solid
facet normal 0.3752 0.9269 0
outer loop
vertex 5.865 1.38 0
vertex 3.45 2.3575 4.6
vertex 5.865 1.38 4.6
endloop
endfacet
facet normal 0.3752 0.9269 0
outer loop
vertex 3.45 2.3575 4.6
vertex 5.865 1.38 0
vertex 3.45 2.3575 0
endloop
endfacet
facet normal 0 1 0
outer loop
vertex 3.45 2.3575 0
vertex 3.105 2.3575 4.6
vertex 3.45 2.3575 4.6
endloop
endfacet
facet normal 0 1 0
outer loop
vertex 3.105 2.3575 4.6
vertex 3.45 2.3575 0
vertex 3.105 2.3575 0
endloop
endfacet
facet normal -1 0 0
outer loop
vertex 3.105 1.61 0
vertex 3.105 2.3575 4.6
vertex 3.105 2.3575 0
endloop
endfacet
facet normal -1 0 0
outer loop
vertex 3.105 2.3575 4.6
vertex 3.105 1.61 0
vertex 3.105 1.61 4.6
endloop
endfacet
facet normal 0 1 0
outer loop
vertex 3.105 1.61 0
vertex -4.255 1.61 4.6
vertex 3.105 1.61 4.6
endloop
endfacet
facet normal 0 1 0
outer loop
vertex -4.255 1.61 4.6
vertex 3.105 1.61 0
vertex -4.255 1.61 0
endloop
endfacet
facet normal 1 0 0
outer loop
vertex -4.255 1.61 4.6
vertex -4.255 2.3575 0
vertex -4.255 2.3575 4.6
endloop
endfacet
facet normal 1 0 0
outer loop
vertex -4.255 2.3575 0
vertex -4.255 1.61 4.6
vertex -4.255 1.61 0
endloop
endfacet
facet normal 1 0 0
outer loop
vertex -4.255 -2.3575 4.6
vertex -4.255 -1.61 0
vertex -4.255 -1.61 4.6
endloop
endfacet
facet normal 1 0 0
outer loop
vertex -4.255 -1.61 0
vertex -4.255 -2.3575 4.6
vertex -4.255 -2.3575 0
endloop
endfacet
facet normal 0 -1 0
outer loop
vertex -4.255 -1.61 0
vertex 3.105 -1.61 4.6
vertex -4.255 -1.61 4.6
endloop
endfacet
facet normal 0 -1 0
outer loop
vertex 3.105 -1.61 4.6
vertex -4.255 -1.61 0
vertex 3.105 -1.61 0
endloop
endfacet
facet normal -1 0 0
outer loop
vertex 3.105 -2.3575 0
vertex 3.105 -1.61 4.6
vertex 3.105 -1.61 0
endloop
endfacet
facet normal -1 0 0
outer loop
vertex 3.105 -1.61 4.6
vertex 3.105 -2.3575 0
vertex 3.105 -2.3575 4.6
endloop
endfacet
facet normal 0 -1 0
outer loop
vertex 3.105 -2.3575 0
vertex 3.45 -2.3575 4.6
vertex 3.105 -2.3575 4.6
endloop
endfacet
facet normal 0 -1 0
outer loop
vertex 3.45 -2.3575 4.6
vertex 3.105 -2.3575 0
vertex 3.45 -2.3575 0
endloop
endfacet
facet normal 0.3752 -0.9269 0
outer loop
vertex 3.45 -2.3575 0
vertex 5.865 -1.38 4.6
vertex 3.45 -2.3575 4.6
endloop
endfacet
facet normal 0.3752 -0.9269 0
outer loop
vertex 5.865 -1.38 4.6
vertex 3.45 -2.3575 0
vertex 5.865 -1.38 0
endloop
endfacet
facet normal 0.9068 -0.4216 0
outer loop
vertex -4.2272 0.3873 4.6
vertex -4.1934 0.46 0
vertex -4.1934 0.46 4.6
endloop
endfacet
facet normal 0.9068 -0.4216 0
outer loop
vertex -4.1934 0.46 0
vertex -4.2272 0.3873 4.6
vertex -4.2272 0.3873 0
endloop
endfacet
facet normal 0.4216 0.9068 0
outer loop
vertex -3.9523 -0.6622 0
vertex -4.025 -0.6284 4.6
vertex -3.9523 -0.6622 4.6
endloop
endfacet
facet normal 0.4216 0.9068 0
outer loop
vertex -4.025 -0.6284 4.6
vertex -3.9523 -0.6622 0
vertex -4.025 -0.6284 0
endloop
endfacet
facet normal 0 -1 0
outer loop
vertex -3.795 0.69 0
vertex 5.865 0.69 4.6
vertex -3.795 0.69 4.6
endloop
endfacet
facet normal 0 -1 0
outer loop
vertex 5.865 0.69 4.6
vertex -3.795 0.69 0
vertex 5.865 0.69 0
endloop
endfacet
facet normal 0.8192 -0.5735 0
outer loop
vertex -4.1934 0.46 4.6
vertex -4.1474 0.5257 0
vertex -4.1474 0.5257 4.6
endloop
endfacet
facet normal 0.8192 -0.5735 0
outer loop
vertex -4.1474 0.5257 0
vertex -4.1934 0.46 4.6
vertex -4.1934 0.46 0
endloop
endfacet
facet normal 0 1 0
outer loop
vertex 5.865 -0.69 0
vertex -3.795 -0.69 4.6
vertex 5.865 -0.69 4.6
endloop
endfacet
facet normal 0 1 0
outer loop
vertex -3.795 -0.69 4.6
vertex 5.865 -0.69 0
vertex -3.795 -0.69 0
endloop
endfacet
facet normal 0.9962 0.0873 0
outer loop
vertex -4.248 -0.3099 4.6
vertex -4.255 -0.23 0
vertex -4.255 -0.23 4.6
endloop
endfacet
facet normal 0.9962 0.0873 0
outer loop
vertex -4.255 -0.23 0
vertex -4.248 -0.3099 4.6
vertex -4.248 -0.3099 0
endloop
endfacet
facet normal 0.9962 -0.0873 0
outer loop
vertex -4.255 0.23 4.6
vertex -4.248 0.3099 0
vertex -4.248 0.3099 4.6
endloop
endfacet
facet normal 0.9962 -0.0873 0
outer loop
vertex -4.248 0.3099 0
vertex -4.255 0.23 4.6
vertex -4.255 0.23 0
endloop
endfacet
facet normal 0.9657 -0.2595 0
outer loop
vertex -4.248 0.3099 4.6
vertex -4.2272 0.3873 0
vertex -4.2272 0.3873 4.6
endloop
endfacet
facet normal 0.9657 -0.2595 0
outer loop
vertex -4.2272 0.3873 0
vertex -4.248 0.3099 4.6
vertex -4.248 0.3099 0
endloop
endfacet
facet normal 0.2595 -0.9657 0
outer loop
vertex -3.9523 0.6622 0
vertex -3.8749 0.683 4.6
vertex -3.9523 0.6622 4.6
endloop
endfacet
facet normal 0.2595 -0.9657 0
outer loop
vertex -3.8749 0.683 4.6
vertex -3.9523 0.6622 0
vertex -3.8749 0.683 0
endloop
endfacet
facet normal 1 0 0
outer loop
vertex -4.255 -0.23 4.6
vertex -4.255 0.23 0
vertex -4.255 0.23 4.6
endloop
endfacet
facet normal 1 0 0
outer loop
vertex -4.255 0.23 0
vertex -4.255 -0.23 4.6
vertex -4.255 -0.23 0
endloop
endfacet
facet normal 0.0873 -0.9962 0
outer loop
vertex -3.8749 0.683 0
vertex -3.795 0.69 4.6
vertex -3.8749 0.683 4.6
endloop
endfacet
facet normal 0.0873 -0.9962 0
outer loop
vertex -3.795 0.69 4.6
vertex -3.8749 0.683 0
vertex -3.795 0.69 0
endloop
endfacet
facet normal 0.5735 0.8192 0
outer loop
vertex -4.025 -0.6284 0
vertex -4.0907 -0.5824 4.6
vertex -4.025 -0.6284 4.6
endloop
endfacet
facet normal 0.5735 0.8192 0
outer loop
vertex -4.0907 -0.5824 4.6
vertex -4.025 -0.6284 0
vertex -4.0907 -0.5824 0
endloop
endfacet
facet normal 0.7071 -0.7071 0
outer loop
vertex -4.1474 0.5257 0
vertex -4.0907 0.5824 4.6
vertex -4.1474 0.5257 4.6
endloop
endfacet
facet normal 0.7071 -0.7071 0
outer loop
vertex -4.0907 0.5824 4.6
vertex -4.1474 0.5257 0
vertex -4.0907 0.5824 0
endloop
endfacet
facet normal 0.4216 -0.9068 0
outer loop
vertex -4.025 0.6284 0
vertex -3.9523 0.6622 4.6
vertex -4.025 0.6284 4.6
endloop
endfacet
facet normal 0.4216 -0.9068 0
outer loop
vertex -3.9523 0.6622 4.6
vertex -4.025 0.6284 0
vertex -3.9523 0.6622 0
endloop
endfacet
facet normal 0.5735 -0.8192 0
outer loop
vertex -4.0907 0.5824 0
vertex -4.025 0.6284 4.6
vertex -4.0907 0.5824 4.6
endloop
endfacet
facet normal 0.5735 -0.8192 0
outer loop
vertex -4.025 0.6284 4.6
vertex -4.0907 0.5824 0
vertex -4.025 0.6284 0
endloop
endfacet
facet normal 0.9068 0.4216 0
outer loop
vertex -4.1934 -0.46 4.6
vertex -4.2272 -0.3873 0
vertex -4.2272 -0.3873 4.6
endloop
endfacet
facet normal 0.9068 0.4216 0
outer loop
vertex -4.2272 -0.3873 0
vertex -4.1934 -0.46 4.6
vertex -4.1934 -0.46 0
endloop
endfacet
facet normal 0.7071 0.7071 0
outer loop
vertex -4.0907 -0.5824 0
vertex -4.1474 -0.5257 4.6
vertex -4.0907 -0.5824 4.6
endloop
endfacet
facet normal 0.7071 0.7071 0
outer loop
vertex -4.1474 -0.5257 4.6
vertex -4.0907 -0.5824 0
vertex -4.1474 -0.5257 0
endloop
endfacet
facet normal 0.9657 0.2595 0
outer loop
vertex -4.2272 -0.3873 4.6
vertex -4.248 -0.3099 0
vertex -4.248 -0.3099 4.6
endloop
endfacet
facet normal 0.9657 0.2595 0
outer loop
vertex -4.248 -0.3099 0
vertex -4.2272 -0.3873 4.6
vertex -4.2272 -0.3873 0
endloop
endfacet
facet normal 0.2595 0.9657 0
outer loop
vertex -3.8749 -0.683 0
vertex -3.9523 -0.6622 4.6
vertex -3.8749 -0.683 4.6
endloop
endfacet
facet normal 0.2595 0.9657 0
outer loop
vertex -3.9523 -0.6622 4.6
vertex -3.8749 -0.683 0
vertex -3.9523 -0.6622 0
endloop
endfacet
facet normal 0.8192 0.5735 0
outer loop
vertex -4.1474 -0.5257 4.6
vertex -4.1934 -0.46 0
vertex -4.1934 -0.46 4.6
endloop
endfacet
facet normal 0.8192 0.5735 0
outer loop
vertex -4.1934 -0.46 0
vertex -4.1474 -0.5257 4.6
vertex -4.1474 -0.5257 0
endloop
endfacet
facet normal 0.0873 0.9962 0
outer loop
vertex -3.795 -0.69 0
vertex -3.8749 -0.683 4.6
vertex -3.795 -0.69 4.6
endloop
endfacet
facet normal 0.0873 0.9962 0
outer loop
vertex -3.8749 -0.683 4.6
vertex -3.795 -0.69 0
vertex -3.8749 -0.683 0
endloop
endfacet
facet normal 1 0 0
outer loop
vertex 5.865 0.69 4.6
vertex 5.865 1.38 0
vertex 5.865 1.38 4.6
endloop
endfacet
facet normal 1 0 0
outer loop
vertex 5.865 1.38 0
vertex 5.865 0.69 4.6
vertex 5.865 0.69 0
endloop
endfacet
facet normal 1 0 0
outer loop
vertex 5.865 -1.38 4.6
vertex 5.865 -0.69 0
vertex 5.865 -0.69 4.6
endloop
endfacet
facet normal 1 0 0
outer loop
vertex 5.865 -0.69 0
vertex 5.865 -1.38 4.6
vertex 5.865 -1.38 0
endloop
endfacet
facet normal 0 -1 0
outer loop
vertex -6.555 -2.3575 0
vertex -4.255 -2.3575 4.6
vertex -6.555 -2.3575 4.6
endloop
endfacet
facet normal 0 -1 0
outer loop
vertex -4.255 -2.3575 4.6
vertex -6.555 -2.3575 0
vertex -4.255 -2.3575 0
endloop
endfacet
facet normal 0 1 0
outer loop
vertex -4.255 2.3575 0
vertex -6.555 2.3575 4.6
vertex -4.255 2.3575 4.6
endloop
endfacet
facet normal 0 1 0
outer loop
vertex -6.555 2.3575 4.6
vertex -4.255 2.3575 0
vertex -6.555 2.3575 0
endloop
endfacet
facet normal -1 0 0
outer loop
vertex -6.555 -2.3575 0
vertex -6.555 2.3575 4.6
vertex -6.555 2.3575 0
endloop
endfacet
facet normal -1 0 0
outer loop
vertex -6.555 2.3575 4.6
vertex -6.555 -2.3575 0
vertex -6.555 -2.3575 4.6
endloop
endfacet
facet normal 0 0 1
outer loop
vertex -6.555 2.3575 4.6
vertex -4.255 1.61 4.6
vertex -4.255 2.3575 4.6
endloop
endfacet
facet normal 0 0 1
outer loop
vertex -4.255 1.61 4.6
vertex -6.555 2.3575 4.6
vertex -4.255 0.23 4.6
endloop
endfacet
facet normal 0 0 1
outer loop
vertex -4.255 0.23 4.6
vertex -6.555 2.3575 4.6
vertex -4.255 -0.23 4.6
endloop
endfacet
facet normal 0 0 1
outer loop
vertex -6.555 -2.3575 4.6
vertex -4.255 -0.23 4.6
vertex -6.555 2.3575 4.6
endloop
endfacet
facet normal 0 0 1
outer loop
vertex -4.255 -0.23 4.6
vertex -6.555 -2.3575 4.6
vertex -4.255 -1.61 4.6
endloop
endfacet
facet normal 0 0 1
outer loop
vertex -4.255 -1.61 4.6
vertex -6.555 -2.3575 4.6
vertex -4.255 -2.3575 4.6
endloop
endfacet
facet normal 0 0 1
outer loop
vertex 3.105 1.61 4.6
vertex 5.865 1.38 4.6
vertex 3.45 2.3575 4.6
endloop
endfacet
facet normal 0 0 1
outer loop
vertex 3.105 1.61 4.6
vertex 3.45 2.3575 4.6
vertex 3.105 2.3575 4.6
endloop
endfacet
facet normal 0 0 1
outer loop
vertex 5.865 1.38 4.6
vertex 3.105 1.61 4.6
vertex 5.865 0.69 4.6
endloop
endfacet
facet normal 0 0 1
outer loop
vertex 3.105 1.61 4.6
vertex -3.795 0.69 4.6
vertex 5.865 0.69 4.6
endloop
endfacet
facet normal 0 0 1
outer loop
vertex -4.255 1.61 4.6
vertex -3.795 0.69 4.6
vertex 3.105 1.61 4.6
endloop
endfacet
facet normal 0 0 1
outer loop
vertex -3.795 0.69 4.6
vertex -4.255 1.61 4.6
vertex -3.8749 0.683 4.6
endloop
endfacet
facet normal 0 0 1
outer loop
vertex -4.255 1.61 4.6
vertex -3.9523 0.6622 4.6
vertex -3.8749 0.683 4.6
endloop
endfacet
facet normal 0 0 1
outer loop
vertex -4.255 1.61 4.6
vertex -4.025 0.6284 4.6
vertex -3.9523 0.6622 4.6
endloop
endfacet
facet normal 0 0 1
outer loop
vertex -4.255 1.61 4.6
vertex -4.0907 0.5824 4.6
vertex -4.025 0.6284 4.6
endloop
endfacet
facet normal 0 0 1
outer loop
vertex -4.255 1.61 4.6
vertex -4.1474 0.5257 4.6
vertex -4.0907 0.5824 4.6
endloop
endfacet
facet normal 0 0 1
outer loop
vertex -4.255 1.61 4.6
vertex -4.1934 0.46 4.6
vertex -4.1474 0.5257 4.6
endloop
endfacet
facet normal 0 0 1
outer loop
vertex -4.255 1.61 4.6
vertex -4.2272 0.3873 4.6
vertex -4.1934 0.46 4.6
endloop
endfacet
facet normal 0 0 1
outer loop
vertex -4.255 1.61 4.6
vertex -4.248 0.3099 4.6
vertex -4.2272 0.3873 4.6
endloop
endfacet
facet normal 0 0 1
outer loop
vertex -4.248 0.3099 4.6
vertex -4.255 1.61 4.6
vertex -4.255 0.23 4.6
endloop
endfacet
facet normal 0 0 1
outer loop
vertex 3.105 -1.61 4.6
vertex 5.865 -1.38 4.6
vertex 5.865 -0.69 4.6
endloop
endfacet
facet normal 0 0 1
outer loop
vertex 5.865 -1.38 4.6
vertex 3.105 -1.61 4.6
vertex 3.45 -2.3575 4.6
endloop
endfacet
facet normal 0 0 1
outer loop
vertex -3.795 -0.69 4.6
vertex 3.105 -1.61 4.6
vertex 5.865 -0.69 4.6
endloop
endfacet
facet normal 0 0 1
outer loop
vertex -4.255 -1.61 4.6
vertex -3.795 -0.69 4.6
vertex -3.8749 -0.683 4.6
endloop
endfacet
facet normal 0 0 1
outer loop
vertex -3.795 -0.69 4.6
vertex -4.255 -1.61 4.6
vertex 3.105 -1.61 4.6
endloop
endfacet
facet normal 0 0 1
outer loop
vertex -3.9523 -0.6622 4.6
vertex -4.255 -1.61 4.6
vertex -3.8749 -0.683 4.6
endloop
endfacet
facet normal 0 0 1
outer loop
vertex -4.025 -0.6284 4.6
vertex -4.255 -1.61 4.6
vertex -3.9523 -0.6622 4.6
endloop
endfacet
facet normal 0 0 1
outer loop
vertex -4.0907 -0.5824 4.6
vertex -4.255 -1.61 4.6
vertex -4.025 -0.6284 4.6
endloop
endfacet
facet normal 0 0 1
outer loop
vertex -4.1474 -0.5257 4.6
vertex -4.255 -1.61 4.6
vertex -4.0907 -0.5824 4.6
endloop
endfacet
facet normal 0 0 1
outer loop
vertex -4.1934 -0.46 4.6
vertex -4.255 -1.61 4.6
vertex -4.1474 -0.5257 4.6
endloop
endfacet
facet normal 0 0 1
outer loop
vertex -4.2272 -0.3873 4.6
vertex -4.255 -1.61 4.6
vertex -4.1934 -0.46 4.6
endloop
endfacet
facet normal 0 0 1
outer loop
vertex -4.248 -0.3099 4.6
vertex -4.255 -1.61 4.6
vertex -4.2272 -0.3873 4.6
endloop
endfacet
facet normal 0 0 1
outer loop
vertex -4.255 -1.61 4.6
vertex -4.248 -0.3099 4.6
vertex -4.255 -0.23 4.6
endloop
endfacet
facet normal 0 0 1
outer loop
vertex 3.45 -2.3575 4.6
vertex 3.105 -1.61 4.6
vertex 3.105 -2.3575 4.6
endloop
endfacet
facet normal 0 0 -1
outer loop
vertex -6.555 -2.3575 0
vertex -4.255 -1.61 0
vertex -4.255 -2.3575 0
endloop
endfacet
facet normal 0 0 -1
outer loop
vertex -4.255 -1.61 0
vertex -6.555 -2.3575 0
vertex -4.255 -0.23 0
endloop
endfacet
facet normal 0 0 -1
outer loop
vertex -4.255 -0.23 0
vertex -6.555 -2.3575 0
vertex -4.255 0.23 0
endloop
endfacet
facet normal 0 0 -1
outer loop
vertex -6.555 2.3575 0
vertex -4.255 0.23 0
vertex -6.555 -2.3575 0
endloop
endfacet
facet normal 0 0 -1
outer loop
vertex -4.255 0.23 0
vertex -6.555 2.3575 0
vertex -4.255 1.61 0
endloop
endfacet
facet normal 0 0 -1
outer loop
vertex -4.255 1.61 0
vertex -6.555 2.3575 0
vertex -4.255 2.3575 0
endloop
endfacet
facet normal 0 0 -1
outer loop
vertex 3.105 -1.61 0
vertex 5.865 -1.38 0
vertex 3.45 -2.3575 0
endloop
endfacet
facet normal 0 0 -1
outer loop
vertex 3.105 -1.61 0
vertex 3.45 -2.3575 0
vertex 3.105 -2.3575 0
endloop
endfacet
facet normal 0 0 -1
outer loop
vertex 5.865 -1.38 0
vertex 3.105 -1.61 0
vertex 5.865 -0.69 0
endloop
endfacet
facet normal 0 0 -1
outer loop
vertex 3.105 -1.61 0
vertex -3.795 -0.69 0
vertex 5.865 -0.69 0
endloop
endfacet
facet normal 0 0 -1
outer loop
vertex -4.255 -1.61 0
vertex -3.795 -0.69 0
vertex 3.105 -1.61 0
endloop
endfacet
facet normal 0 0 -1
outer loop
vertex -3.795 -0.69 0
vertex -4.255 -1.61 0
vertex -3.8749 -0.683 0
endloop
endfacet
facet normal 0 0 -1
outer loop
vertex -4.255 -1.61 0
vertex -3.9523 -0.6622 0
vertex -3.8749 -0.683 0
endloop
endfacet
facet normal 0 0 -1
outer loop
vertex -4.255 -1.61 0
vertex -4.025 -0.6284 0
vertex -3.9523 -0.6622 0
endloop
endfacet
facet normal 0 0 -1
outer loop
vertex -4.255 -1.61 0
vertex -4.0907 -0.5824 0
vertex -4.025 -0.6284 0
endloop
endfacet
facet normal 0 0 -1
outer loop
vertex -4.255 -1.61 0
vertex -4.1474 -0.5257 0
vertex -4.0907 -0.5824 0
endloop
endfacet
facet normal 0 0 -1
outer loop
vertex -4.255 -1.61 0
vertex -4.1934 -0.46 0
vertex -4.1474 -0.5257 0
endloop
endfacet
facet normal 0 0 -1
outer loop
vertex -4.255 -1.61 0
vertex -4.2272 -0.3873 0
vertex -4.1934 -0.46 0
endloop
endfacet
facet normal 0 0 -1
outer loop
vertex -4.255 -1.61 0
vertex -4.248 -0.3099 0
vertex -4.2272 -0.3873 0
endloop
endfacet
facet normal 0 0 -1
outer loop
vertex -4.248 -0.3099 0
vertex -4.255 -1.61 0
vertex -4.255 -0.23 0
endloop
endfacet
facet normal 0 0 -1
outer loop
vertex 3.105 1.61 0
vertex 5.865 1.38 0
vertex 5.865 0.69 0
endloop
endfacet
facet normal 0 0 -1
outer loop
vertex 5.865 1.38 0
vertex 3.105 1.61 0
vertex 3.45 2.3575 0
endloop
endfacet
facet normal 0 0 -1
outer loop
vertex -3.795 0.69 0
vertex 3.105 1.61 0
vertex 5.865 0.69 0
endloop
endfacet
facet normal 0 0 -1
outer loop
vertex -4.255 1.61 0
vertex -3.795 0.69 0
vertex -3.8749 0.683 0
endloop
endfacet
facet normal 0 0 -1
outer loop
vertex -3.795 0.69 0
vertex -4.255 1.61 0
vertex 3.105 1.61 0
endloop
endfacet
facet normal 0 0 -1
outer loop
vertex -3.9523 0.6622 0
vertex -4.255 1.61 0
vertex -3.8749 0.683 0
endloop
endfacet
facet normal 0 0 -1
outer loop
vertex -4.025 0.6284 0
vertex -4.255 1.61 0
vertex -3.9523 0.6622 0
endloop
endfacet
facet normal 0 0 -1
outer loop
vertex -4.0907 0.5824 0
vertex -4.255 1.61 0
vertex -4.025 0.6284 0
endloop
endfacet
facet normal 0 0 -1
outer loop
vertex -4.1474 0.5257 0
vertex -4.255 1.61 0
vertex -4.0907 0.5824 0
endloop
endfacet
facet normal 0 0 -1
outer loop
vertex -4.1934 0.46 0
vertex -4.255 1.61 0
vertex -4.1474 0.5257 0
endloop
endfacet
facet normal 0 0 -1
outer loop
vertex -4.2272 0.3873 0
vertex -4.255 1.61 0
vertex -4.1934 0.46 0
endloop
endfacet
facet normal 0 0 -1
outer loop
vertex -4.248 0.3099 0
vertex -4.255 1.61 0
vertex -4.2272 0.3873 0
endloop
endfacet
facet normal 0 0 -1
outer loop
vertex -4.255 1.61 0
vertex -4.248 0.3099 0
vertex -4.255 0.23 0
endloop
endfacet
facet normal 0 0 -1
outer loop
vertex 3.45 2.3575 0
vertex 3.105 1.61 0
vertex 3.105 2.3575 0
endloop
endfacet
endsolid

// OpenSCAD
$fn = 50;

difference() {
	union() {
		translate(v = [0, 0, 0]) {
			rotate(a = [90, 0, 0]) {
				difference() {
					union() {
						translate(v = [-6.555, 0, -2.3575]) {
							cube(size = [12.42, 4.6, 4.715]);
						}
					}
					union() {
						translate(v = [0, 4.699999999999999, 0]) {
							rotate(a = [90, 0, 0]) {
								linear_extrude(height = 4.8) {
									polygon(points = [[-4.255, -1.61], [3.105, -1.61], [3.105, -2.3575], [3.45, -2.3575], [5.865, -1.38], [5.965, -1.38], [5.965, -2.4575], [-4.255, -2.4575]]);
								}
							}
						}
						translate(v = [0, 4.699999999999999, 0]) {
							rotate(a = [90, 0, 0]) {
								linear_extrude(height = 4.8) {
									polygon(points = [[-4.255, 1.61], [3.105, 1.61], [3.105, 2.3575], [3.45, 2.3575], [5.865, 1.38], [5.965, 1.38], [5.965, 2.4575], [-4.255, 2.4575]]);
								}
							}
						}
						translate(v = [0, 4.699999999999999, 0]) {
							rotate(a = [90, 0, 0]) {
								linear_extrude(height = 4.8) {
									polygon(points = [[-4.255, 0.23], [-4.248012, 0.309878], [-4.227259, 0.387329], [-4.193372, 0.46], [-4.14738, 0.525682], [-4.090682, 0.58238], [-4.025, 0.628372], [-3.952329, 0.662259], [-3.874878, 0.683012], [-3.795, 0.69], [5.965, 0.69], [5.965, -0.69], [-3.795, -0.69], [-3.874878, -0.683012], [-3.952329, -0.662259], [-4.025, -0.628372], [-4.090682, -0.58238], [-4.14738, -0.525682], [-4.193372, -0.46], [-4.227259, -0.387329], [-4.248012, -0.309878], [-4.255, -0.23]]);
								}
							}
						}
					}
				}
			}
		}
	}
	union();
}
